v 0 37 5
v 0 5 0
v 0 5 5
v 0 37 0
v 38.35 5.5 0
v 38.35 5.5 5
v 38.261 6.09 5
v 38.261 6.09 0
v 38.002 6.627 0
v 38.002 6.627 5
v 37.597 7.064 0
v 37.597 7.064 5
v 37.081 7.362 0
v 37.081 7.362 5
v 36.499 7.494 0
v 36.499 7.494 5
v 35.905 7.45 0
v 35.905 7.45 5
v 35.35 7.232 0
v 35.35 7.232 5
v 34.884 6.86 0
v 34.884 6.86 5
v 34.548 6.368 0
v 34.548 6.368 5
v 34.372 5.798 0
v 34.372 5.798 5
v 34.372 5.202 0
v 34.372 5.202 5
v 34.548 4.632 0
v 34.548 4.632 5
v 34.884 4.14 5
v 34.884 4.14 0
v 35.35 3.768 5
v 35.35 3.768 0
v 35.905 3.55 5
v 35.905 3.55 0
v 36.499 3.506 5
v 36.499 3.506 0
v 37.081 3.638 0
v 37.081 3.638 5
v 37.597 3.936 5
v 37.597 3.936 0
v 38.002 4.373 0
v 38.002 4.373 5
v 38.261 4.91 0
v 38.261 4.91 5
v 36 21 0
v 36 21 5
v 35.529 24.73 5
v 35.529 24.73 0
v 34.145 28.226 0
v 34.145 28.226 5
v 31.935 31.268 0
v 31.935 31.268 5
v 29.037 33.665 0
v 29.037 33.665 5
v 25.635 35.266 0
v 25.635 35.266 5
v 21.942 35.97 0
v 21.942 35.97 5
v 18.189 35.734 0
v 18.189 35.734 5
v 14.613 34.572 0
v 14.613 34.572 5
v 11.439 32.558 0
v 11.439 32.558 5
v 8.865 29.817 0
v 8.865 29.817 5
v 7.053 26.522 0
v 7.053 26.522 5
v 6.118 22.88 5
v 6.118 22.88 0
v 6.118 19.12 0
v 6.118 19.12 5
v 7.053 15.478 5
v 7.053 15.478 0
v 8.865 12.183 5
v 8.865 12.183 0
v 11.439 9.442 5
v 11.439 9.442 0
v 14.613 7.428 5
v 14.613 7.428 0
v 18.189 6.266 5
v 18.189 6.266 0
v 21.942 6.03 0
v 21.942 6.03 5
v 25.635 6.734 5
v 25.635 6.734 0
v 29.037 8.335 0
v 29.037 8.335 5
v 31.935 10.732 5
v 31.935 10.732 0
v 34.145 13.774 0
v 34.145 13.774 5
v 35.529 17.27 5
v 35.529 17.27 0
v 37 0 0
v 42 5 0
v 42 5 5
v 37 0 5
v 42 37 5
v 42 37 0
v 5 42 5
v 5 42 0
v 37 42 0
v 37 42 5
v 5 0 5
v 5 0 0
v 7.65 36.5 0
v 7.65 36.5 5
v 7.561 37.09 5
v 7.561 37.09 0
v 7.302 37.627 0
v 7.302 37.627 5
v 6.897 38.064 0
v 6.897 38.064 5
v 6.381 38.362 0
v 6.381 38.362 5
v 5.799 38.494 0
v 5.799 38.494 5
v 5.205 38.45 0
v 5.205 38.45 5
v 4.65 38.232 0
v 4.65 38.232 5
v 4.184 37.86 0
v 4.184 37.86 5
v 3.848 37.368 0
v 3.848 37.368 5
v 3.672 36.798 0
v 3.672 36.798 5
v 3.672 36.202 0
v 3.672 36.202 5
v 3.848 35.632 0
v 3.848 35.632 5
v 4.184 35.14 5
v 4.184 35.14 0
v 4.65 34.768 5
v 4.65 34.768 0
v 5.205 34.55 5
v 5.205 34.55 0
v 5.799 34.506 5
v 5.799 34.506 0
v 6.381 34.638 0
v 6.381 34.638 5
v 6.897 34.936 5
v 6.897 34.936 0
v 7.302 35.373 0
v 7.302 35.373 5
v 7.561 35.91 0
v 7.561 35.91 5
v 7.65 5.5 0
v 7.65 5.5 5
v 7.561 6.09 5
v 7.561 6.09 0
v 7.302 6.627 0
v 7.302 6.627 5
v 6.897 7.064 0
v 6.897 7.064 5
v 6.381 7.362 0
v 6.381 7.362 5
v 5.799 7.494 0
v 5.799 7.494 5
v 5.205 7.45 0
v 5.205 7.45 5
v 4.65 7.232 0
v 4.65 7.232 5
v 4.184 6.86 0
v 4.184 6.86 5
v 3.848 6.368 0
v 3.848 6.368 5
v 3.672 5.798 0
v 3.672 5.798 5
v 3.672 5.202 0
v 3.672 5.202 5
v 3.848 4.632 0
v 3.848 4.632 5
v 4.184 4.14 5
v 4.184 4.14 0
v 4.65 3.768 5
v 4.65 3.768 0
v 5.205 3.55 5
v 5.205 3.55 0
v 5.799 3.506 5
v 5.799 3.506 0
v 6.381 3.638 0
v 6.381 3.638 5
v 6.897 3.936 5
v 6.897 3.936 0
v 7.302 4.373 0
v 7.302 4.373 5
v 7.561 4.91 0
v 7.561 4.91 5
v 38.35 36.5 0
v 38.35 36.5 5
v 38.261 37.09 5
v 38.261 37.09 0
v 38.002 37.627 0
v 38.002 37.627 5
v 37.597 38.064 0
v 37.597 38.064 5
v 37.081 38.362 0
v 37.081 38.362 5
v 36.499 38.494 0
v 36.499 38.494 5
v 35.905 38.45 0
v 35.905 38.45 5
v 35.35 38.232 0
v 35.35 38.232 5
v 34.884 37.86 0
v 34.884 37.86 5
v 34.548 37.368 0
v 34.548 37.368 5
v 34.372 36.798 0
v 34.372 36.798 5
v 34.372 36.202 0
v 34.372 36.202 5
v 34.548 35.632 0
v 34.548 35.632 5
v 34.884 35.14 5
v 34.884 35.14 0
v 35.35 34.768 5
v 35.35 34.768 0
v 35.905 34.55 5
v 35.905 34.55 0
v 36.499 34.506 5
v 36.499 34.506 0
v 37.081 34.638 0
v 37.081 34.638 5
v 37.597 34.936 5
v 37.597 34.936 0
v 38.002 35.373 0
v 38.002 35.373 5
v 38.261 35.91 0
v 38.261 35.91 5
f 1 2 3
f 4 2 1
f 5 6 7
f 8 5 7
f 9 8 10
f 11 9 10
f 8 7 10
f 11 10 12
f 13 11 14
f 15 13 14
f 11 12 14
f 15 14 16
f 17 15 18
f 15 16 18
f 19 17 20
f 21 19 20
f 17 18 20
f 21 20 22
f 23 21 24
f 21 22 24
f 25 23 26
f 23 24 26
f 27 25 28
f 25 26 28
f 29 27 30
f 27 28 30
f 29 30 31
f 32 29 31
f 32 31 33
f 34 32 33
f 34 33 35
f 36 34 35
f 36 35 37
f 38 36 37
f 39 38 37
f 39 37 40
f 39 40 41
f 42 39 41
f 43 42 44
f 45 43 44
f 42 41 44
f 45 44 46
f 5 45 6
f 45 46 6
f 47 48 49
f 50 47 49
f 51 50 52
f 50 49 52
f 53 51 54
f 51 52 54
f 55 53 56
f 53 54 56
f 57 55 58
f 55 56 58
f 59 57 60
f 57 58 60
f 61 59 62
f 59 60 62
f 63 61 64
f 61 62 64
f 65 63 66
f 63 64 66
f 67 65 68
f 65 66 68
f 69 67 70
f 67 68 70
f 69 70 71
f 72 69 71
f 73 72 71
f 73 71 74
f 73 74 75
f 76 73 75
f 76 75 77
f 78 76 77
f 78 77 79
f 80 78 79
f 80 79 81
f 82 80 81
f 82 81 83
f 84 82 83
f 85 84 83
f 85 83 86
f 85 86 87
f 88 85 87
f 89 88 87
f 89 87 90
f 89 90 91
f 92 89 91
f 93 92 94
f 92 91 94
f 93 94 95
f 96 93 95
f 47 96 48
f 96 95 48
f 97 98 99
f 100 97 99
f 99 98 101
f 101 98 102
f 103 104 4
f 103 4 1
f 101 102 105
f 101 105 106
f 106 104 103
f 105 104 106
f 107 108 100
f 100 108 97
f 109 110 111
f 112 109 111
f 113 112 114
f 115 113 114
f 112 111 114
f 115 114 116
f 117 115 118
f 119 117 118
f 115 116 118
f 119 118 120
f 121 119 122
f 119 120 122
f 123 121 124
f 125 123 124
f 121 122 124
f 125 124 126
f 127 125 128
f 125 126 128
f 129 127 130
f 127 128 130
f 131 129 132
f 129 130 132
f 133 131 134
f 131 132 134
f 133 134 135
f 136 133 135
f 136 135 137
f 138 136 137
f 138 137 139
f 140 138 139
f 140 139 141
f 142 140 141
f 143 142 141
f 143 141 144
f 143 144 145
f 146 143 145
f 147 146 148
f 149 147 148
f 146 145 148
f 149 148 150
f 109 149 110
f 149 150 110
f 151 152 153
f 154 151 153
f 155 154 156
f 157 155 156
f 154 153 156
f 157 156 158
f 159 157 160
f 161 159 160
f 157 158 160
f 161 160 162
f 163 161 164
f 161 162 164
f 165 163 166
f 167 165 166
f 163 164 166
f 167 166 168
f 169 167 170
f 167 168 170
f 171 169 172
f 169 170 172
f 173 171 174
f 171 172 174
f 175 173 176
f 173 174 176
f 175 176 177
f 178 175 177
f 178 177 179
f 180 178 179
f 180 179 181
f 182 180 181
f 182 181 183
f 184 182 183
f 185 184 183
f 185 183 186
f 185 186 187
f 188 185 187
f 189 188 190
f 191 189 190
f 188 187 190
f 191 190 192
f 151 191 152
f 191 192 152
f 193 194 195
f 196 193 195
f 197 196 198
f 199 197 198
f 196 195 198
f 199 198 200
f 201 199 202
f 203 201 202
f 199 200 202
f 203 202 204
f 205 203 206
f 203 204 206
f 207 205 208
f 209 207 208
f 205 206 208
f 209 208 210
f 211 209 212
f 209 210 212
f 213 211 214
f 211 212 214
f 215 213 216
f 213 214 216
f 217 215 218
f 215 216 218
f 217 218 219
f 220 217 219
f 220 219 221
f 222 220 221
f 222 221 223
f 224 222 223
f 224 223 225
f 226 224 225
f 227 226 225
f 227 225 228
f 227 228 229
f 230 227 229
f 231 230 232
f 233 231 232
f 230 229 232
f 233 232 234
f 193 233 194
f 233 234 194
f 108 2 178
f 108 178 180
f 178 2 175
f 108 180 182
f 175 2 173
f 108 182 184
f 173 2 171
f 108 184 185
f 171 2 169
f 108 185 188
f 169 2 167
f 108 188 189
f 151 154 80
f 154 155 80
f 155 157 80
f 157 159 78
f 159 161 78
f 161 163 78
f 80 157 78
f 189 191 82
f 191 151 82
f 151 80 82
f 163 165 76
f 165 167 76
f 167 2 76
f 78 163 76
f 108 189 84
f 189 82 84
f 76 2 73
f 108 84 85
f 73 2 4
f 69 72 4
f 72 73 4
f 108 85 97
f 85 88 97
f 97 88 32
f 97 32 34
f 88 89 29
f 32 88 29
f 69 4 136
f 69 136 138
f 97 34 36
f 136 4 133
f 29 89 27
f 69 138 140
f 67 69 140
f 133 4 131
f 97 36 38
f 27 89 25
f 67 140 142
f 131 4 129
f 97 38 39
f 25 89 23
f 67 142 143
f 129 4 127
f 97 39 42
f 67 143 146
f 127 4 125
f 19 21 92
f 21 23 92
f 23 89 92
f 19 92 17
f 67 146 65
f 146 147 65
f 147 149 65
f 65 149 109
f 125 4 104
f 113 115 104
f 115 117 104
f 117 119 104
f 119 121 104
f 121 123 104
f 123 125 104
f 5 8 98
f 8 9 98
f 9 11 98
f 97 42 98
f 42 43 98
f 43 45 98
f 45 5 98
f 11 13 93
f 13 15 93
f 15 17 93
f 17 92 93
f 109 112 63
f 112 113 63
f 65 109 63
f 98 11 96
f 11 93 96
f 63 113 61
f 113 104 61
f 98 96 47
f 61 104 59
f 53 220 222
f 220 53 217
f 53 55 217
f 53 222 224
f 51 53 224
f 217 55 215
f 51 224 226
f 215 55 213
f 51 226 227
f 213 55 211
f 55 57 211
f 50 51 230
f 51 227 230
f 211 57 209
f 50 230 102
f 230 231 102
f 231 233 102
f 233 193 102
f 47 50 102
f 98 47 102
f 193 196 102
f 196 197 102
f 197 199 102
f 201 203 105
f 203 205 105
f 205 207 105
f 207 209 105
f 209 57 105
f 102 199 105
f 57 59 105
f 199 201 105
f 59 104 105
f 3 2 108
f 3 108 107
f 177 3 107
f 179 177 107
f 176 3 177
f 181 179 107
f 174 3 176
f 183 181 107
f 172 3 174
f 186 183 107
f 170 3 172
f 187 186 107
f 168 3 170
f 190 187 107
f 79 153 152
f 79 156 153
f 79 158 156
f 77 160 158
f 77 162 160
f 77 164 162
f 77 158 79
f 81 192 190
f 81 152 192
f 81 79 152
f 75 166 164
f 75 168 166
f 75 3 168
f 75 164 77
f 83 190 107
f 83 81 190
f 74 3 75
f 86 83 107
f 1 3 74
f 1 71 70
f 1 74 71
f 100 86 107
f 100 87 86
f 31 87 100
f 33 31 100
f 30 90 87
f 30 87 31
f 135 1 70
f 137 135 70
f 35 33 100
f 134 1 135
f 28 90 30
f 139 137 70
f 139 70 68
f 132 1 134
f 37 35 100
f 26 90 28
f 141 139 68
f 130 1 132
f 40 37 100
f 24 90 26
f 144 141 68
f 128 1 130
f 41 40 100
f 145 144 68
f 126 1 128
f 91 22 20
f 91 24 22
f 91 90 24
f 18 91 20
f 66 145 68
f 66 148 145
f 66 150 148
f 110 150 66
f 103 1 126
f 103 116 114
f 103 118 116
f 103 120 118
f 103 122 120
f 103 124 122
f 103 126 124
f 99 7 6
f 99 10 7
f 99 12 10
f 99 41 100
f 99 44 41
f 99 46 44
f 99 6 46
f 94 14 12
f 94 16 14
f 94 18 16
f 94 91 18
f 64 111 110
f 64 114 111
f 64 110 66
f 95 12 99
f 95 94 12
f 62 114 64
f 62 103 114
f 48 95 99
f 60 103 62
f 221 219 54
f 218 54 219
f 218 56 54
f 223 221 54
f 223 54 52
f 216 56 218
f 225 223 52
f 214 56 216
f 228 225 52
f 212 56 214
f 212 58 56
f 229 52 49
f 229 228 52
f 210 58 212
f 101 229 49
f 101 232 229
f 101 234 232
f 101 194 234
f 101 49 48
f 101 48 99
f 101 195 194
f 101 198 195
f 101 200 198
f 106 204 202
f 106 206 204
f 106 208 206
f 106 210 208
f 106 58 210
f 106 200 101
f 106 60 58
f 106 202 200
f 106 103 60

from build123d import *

# Parameters (mm, degrees)
SKETCH1_W           = 42
SKETCH1_H           = 42
BOSS_EXTRUDE1_DEPTH = 5
SKETCH2_R           = 15
CUT_EXTRUDE1_DEPTH  = 6
SKETCH4_R           = 2
CUT_EXTRUDE3_DEPTH  = 5
CHAMFER1_SIZE       = 5


with BuildPart() as part:
    # Sketch1 → Boss-Extrude1 (new body)
    with BuildSketch(Plane.XY):
        with Locations((21, 21)):
            Rectangle(SKETCH1_W, SKETCH1_H)
    extrude(amount=BOSS_EXTRUDE1_DEPTH)

    # Sketch2 → Cut-Extrude1 (cut, through all)
    with BuildSketch(Plane.XY.offset(5)):
        with Locations((21, 21)):
            Circle(SKETCH2_R)
    extrude(amount=-CUT_EXTRUDE1_DEPTH, mode=Mode.SUBTRACT)

    # Sketch4 → Cut-Extrude3 (cut)
    with BuildSketch(Plane.XY.offset(5)):
        with Locations((5.65, 36.5)):
            Circle(SKETCH4_R)
        with Locations((5.65, 5.5)):
            Circle(SKETCH4_R)
        with Locations((36.35, 5.5)):
            Circle(SKETCH4_R)
        with Locations((36.35, 36.5)):
            Circle(SKETCH4_R)
    extrude(amount=-CUT_EXTRUDE3_DEPTH, mode=Mode.SUBTRACT)

    # Chamfer1
    chamfer1_edges = [part.edges().sort_by_distance(p)[0] for p in [
        (0, 42, 2.5),
        (42, 42, 2.5),
        (42, 0, 2.5),
        (0, 0, 2.5),
    ]]
    chamfer(chamfer1_edges, length=CHAMFER1_SIZE)


solid = part.part
